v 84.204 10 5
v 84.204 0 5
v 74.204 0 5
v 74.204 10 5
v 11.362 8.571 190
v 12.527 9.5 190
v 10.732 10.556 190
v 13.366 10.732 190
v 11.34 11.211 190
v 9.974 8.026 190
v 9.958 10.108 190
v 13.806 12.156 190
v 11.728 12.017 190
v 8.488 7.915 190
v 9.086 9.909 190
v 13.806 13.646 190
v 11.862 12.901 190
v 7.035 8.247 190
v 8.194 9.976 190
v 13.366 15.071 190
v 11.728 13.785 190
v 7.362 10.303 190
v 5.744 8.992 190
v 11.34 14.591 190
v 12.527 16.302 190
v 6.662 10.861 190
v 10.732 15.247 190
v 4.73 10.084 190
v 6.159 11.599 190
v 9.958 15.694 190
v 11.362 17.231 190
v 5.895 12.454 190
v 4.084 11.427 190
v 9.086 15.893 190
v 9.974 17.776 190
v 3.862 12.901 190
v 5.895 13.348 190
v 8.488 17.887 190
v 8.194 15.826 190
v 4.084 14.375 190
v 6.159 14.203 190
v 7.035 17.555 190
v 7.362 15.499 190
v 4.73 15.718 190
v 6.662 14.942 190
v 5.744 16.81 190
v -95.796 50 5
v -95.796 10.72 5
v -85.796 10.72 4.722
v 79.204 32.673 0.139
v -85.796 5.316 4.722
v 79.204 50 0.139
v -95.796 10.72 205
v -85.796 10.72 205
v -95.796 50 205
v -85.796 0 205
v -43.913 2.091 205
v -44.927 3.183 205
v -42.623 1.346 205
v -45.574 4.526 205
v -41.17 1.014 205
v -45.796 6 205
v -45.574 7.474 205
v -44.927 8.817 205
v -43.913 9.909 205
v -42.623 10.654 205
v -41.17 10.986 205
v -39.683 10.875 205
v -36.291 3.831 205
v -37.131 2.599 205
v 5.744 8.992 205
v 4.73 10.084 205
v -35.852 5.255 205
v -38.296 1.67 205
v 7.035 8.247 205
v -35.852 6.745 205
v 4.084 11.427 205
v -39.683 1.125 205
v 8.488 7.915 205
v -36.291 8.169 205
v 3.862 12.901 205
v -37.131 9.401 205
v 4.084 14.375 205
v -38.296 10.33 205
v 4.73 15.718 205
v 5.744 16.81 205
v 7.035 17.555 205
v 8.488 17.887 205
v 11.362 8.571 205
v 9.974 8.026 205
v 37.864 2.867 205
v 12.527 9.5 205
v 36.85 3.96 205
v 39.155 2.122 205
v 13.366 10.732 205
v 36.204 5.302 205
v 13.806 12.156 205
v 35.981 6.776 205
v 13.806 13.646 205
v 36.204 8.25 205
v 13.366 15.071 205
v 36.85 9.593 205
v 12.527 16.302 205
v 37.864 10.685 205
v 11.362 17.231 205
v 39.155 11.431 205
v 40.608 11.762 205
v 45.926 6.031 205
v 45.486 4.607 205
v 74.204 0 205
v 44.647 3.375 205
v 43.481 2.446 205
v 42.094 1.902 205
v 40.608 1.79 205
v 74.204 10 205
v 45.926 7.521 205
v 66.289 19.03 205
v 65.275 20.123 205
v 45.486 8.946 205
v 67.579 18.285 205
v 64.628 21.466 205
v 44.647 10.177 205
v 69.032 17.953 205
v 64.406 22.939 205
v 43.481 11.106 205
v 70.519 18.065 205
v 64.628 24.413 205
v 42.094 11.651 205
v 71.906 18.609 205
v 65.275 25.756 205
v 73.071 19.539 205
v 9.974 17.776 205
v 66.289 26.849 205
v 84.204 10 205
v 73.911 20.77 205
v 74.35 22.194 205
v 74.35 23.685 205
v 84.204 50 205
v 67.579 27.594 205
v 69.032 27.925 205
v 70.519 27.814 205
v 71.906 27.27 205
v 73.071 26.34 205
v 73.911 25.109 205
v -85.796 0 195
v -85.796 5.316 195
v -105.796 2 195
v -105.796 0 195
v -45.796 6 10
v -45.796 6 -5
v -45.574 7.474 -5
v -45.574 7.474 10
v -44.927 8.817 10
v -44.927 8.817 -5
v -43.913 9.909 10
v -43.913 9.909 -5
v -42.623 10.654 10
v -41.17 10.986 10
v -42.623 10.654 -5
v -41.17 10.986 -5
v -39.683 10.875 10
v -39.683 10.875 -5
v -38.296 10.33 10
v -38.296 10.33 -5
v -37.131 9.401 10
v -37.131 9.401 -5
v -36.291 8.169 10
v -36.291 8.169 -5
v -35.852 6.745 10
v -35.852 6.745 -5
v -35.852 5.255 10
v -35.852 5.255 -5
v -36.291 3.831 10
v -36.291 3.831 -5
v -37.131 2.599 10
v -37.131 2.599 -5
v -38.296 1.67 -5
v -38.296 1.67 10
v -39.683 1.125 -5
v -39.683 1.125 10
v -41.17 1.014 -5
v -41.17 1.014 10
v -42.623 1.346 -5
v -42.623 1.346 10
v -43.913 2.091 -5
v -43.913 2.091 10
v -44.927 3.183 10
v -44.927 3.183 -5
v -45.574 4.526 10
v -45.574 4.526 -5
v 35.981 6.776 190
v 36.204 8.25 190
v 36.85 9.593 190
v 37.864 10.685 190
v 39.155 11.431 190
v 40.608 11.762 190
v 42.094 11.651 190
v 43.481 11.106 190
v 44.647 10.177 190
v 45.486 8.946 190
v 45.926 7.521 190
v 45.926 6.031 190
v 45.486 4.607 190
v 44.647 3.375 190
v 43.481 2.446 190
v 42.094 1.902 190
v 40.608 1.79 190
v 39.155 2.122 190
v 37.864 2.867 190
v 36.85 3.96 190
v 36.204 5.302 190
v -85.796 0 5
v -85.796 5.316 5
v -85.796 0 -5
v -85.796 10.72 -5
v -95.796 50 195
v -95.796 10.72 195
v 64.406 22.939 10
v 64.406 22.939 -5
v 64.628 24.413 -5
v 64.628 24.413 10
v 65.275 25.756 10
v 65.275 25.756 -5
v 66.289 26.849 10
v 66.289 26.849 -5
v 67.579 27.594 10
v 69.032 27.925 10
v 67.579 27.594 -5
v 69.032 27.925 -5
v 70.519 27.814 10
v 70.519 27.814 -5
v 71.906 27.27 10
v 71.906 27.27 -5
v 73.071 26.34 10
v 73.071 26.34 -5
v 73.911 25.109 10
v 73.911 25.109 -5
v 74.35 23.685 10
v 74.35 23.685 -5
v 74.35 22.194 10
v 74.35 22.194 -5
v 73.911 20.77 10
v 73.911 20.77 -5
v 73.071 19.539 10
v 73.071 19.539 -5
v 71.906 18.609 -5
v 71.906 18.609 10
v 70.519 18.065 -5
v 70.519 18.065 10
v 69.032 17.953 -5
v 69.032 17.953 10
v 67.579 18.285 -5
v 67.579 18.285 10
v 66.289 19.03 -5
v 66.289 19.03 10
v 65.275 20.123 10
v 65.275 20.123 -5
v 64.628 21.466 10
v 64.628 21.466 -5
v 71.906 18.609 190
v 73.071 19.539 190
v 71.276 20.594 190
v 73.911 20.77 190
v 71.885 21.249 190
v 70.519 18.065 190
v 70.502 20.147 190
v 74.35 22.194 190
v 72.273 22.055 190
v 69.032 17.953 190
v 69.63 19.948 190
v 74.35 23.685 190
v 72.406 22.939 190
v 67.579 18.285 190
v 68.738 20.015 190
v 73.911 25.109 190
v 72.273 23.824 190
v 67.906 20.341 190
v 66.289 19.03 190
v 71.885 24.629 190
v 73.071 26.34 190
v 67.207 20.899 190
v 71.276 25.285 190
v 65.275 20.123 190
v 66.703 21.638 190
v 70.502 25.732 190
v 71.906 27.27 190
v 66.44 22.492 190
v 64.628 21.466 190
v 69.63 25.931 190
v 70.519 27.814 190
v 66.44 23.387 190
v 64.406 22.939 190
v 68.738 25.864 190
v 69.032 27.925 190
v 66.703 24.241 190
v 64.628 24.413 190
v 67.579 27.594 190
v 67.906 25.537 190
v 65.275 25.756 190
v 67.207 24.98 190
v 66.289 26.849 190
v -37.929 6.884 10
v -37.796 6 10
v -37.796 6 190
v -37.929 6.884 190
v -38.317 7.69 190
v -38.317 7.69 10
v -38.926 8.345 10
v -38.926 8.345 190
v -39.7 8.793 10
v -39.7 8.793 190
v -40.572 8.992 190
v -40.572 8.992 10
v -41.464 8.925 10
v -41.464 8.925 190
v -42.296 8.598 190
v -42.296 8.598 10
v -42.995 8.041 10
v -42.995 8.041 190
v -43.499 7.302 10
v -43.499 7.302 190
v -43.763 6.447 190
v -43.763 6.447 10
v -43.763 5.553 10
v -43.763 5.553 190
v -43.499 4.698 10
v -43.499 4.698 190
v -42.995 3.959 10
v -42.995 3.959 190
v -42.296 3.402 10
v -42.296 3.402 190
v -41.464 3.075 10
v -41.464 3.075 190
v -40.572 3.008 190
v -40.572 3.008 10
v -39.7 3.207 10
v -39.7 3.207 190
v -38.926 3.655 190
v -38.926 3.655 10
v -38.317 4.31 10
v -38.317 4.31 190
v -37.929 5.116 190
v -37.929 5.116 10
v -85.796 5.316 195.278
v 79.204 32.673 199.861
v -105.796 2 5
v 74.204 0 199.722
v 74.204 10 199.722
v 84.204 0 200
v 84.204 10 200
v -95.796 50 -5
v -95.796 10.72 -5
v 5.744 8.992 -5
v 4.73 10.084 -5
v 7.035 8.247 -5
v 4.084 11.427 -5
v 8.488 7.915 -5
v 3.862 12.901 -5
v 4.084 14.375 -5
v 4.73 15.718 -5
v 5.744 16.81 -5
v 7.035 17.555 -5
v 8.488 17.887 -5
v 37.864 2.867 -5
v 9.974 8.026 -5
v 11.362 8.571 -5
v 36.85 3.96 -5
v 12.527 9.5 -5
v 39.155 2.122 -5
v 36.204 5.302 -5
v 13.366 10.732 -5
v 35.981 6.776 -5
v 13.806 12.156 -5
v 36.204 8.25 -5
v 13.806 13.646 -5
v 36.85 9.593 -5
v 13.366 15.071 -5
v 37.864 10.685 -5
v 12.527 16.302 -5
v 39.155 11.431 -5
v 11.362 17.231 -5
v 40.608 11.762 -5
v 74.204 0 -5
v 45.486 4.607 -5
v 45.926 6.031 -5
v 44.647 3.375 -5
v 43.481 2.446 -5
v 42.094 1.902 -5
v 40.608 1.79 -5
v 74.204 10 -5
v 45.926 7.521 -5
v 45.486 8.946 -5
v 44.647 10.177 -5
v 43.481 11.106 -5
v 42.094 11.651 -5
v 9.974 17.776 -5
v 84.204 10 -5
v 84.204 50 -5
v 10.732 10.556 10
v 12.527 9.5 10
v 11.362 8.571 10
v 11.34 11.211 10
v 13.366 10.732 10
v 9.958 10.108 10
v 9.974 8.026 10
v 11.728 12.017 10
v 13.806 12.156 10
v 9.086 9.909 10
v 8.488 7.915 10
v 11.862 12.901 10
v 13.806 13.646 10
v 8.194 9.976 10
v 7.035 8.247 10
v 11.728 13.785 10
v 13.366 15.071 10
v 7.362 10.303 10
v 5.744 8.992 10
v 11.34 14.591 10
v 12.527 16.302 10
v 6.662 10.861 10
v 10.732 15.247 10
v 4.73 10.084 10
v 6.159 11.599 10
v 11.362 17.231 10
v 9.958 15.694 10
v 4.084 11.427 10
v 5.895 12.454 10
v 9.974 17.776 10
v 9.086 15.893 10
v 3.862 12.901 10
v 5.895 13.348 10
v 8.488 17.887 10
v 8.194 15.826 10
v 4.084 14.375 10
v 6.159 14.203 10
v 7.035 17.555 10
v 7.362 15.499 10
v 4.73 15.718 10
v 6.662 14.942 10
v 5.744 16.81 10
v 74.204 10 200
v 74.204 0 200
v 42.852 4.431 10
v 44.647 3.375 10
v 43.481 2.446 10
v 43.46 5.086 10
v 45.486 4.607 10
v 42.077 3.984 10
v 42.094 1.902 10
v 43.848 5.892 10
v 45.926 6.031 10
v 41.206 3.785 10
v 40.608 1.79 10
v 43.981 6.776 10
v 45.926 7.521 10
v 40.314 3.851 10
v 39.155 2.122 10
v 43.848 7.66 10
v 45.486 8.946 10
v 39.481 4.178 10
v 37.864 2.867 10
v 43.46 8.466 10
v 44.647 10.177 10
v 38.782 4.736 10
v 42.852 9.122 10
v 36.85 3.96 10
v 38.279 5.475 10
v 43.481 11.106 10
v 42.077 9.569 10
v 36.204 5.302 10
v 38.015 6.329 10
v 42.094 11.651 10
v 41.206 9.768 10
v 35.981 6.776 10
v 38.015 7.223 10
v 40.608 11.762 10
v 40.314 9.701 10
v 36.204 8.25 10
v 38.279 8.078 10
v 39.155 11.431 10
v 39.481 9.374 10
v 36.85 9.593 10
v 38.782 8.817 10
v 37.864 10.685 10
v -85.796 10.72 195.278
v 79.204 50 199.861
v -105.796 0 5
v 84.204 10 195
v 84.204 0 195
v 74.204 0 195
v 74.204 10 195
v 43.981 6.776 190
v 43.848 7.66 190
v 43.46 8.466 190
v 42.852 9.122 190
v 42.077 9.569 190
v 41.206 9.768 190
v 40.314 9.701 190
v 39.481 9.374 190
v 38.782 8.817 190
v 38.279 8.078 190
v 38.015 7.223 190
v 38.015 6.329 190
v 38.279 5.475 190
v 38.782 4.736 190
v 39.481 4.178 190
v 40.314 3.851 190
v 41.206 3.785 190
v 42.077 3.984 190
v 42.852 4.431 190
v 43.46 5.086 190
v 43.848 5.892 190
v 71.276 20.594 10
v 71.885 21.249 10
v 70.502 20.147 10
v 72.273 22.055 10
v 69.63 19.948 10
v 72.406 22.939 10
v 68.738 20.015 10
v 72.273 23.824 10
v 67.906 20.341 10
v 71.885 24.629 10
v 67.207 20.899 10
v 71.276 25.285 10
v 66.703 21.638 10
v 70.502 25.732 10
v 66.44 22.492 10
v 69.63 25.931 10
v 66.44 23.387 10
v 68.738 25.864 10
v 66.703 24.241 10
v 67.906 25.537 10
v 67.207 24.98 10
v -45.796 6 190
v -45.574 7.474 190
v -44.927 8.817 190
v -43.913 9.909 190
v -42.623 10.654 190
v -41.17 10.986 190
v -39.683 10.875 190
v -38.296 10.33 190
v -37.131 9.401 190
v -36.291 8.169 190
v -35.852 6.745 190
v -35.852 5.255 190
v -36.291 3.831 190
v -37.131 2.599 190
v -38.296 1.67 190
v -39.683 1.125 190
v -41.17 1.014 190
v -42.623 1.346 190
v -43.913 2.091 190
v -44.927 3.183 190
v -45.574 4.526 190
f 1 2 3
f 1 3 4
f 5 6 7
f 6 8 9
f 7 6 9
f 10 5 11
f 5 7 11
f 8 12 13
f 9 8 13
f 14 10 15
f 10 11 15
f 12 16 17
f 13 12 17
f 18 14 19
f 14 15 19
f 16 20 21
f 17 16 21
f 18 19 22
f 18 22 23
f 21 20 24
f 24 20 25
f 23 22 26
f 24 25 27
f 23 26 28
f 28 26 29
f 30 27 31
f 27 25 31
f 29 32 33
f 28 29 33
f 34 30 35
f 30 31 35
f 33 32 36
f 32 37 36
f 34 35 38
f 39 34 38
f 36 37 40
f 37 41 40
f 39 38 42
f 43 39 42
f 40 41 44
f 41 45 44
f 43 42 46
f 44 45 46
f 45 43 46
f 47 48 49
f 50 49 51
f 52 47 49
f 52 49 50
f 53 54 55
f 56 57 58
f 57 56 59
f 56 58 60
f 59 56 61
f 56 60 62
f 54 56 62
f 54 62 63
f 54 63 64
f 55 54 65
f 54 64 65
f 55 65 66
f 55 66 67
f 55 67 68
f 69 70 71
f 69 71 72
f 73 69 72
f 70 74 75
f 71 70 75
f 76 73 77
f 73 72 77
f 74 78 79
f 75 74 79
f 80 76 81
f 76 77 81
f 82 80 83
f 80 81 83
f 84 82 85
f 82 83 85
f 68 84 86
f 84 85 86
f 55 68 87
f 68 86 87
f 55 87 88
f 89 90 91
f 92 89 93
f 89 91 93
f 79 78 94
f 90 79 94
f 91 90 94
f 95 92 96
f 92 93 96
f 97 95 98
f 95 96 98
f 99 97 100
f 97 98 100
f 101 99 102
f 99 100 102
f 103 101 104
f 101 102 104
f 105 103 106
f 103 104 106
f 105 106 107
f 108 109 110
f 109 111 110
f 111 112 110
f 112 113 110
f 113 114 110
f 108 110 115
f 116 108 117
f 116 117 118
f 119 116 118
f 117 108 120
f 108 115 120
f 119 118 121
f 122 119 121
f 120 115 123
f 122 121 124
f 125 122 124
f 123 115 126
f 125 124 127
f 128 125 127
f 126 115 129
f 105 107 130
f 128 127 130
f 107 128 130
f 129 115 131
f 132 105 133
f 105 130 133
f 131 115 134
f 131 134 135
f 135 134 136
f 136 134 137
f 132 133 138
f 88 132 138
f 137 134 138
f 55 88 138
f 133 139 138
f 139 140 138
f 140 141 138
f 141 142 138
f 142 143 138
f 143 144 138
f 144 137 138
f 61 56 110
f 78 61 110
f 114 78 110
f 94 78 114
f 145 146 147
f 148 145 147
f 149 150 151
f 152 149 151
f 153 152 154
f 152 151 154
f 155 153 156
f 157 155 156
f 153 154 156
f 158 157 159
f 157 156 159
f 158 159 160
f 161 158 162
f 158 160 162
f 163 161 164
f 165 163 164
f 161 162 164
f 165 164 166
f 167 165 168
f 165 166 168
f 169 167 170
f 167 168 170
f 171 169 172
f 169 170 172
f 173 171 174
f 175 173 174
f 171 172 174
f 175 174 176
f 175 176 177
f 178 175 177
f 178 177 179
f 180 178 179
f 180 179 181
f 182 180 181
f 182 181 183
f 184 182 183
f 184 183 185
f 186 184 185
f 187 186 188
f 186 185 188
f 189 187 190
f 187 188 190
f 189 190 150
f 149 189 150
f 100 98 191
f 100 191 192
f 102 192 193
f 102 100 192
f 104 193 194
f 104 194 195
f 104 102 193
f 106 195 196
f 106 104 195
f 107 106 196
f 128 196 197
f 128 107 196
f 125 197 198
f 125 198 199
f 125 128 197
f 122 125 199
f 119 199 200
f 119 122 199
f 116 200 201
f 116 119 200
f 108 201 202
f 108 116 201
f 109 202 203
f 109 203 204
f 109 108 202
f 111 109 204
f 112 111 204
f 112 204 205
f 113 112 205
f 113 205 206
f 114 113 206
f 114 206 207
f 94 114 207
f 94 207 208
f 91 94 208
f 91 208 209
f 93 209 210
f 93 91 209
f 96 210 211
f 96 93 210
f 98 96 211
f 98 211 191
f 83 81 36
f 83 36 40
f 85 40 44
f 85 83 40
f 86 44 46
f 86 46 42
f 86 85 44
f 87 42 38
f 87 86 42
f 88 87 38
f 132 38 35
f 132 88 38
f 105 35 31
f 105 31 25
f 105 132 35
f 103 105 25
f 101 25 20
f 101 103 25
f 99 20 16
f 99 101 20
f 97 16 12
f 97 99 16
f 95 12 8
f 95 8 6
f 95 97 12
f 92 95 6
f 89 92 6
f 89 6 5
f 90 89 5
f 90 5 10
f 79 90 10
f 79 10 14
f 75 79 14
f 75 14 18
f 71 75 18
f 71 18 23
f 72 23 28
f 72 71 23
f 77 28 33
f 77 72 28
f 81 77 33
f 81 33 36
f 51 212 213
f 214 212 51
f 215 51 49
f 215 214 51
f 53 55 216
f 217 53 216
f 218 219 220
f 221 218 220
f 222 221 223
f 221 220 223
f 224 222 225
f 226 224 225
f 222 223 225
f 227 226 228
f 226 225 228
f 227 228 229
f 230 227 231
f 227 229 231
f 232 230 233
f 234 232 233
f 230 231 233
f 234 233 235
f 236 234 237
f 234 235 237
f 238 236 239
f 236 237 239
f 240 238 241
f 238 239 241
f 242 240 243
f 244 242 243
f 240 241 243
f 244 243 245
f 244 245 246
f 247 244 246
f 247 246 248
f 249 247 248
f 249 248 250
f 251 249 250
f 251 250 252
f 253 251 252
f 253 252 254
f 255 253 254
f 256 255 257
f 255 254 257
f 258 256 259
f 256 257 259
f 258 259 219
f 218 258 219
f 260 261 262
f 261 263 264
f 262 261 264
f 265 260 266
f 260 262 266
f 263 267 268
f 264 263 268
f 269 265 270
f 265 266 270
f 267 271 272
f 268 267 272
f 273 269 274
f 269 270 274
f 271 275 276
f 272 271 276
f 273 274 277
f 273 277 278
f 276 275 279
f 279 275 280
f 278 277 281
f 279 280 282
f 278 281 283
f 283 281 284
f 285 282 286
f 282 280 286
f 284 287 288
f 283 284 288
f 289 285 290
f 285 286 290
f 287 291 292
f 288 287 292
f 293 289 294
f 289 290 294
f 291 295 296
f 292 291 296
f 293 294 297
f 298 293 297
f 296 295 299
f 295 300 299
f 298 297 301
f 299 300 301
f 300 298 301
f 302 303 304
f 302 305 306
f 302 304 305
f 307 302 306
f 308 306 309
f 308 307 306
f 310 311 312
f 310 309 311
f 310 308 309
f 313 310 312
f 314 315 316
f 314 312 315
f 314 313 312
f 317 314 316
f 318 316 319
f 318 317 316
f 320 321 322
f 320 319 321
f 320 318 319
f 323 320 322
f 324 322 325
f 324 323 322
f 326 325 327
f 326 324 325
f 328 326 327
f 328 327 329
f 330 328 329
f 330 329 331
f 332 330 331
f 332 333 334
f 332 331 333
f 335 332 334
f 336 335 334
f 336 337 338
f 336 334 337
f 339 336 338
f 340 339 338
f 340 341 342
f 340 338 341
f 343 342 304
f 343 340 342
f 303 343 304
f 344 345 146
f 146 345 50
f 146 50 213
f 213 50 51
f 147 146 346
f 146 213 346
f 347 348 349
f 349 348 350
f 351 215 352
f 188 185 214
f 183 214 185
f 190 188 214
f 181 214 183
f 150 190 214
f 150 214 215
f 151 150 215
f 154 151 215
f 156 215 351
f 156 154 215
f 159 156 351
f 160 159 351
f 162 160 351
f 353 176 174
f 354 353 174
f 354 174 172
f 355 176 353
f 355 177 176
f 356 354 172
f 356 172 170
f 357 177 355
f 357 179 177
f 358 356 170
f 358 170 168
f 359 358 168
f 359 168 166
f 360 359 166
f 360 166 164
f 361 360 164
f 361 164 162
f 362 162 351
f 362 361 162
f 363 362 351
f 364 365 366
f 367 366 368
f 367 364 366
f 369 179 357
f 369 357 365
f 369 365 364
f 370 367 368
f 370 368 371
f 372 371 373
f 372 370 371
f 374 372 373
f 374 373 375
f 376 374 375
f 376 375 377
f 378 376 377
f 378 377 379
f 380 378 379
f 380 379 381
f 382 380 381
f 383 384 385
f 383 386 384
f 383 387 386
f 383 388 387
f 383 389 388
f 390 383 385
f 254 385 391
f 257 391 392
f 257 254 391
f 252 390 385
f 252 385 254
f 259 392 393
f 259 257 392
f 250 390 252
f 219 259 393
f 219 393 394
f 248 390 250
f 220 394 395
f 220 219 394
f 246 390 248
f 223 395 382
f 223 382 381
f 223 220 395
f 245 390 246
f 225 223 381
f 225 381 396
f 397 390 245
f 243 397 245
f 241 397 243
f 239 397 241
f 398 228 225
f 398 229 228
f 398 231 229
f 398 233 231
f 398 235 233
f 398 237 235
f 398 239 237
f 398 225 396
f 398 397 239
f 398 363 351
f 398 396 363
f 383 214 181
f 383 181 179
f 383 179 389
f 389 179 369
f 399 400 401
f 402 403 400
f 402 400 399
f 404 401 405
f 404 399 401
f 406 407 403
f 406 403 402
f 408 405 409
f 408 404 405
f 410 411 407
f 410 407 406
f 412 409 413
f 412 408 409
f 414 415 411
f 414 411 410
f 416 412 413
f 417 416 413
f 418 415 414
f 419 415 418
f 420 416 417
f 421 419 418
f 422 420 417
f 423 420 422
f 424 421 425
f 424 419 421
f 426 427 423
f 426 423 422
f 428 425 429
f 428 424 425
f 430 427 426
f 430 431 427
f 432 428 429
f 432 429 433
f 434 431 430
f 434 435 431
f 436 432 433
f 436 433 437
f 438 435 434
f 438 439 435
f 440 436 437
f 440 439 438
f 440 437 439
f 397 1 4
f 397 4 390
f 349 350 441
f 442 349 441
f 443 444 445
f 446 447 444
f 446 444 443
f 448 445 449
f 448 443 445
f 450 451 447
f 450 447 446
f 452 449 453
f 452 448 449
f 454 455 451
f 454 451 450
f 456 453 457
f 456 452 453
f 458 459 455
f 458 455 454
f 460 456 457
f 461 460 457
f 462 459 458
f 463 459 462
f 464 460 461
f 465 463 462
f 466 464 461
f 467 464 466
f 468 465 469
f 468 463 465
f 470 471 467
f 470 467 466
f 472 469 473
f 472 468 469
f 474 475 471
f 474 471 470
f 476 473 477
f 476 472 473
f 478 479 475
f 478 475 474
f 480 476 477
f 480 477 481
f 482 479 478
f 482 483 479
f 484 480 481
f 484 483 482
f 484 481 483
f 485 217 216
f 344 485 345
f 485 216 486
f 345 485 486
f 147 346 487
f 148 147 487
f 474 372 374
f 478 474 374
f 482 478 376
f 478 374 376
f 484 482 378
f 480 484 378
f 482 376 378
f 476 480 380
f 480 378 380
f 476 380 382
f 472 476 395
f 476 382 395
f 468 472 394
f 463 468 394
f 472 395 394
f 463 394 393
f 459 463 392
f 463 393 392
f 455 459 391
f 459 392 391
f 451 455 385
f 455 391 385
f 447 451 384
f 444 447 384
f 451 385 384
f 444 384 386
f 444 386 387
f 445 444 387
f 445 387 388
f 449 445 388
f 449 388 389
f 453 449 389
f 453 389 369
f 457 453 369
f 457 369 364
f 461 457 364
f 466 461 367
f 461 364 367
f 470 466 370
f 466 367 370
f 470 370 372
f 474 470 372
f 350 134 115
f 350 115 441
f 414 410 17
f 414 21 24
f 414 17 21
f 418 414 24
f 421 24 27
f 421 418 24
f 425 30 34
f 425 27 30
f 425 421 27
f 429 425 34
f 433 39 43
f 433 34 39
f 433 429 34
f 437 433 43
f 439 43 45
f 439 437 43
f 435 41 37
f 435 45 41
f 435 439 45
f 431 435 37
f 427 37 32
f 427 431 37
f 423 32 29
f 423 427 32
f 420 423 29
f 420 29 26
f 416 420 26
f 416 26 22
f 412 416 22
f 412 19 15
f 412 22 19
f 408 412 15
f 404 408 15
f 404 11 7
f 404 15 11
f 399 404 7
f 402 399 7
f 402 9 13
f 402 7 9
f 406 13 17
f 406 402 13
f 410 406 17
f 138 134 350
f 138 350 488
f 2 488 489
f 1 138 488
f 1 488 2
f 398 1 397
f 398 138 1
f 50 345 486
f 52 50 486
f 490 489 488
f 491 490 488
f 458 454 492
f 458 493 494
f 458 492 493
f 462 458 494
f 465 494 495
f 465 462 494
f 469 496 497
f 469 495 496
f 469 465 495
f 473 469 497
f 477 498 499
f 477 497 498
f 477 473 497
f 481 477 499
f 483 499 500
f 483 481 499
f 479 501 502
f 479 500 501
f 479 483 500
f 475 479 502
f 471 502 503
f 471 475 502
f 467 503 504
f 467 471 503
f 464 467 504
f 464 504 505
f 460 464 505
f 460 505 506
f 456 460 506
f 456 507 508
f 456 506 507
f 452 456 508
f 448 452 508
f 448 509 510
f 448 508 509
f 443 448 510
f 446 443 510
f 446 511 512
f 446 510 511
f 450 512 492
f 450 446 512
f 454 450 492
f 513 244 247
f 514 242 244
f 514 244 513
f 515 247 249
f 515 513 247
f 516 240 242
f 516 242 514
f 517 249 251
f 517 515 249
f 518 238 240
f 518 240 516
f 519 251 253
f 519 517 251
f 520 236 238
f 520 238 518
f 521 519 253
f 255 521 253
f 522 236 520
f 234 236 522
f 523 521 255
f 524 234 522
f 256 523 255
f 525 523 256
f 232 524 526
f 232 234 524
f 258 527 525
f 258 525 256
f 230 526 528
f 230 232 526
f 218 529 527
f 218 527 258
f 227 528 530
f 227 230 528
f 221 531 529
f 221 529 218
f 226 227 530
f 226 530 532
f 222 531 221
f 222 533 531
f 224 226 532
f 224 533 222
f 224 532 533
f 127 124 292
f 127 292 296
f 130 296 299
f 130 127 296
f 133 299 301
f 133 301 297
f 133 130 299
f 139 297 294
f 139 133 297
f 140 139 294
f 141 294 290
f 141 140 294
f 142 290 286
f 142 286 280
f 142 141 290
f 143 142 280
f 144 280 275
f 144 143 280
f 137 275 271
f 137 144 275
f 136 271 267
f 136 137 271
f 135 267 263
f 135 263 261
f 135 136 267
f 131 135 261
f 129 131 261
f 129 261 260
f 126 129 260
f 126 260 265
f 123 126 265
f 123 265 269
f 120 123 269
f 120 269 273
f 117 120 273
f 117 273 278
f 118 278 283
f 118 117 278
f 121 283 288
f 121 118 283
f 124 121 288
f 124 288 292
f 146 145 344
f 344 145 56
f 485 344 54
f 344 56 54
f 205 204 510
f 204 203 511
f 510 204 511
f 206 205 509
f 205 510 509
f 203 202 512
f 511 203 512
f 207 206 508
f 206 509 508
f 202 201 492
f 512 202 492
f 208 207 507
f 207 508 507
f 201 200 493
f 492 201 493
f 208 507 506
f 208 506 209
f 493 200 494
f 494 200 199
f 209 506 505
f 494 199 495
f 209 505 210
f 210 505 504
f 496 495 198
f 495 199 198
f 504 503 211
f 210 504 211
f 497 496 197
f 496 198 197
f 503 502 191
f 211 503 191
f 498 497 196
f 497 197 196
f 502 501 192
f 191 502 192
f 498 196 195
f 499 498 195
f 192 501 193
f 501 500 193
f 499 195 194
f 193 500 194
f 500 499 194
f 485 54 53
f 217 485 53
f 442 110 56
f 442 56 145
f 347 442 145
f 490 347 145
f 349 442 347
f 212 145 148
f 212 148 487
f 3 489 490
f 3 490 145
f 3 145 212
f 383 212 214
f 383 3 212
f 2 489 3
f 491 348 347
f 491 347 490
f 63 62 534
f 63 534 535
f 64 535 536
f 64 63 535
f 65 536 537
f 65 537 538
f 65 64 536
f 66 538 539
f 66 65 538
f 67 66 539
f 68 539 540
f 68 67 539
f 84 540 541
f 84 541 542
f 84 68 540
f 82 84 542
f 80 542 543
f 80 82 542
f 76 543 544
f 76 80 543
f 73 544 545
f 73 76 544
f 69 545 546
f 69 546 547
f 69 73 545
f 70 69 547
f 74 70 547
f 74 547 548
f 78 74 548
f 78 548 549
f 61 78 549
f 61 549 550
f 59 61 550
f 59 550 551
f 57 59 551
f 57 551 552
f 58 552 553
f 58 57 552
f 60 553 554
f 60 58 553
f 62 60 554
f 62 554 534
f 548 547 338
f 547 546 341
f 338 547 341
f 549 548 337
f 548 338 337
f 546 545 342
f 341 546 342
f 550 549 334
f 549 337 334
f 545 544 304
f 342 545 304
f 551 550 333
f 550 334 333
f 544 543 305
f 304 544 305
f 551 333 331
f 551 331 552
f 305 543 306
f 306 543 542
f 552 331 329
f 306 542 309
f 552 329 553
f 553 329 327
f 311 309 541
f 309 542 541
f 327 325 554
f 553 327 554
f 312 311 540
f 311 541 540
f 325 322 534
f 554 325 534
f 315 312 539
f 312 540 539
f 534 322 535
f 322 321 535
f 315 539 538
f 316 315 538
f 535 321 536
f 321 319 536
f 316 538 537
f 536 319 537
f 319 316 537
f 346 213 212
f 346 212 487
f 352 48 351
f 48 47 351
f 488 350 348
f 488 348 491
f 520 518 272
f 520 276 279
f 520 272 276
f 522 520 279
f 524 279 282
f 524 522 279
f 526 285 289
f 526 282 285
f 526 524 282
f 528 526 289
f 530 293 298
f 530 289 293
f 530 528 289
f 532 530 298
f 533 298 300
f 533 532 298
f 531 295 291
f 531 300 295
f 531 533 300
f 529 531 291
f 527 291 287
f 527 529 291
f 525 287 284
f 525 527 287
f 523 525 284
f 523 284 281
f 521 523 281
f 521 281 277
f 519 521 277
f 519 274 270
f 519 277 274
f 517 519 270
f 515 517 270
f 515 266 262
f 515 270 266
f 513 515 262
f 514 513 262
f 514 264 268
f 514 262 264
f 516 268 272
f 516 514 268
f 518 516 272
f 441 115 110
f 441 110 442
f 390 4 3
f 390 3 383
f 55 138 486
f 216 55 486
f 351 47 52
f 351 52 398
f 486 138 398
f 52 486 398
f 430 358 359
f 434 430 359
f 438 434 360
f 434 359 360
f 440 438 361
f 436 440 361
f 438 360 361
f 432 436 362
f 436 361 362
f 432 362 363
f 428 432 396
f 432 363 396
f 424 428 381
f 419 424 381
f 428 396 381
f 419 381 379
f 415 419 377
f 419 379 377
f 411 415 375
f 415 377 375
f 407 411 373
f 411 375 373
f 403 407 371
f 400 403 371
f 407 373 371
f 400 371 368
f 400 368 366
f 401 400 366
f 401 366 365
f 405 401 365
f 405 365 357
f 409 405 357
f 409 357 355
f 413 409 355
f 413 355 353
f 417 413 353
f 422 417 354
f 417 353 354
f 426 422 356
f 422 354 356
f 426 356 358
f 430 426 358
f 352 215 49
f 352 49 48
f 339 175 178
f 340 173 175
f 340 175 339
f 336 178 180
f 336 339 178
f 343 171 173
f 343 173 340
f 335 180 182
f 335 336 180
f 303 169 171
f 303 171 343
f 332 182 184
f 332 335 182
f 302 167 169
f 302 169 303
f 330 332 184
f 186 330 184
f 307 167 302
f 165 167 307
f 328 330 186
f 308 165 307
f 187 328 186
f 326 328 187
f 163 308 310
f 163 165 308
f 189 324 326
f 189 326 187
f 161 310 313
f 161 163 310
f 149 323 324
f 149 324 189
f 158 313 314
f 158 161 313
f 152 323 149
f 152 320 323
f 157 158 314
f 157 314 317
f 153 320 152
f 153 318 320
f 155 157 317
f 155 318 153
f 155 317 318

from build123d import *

# Parameters (mm, degrees)
ESQUISSE1_R             = 3
BOSS_EXTRU_1_DEPTH      = 200
ESQUISSE4_W             = 5
ESQUISSE4_H             = 50
BOSS_EXTRU_4_DEPTH      = 180
BOSS_EXTRU_7_DEPTH      = 50
ESQUISSE6_W             = 20
ESQUISSE6_H             = 10.719834163
ENL_V_MAT_EXTRU_2_DEPTH = 10
ESQUISSE5_W             = 10
ESQUISSE5_H             = 10
ENL_V_MAT_EXTRU_1_DEPTH = 10
ESQUISSE14_R            = 5
ENL_V_MAT_EXTRU_4_DEPTH = 15
BOSS_EXTRU_8_REACH      = 242.401


with BuildPart() as part:
    # Esquisse1 → Boss.-Extru.1 (new body)
    with BuildSketch(Plane.XY):
        Polygon((-105.796013405, 0), (84.203986595, 0), (84.203986595, 33.502126335), (-105.796013405, 2), align=None)
        with Locations((69.406004871, 22.939397164)):
            Circle(ESQUISSE1_R, mode=Mode.SUBTRACT)
        with Locations((40.981469067, 6.77616521)):
            Circle(ESQUISSE1_R, mode=Mode.SUBTRACT)
        with Locations((-40.796013405, 6)):
            Circle(ESQUISSE1_R, mode=Mode.SUBTRACT)
        with Locations((8.861542866, 12.901085106)):
            Circle(ESQUISSE1_R, mode=Mode.SUBTRACT)
    extrude(amount=BOSS_EXTRU_1_DEPTH)

    # Esquisse4 → Boss.-Extru.4 (add)
    with BuildSketch(Plane(origin=(84.203986595, 0, 0), x_dir=(0, 0, -1), z_dir=(1, 0, 0))):
        with Locations((-202.5, 25)):
            Rectangle(ESQUISSE4_W, ESQUISSE4_H)
        with Locations((2.5, 25)):
            Rectangle(ESQUISSE4_W, ESQUISSE4_H)
    extrude(amount=-BOSS_EXTRU_4_DEPTH)

    # Esquisse8 → Boss.-Extru.7 (add)
    with BuildSketch(Plane(origin=(0, 50, 0), x_dir=(1, 0, 0), z_dir=(0, 1, 0))):
        Polygon((84.203986595, 0), (-95.796013405, 0), (-95.796013405, -5), align=None)
    boss_extru_7 = extrude(amount=-BOSS_EXTRU_7_DEPTH)

    # Esquisse6 → Enlèv. mat.-Extru.2 (cut)
    with BuildSketch(Plane(origin=(0, 0, -5), x_dir=(-1, 0, 0), z_dir=(0, 0, -1))):
        with Locations((95.796013405, 5.359917081)):
            Rectangle(ESQUISSE6_W, ESQUISSE6_H)
    enl_v_mat_extru_2 = extrude(amount=-ENL_V_MAT_EXTRU_2_DEPTH, mode=Mode.SUBTRACT)

    # Esquisse5 → Enlèv. mat.-Extru.1 (cut)
    with BuildSketch(Plane(origin=(84.203986595, 0, 0), x_dir=(0, 0, -1), z_dir=(1, 0, 0))):
        with Locations((-200, 5)):
            Rectangle(ESQUISSE5_W, ESQUISSE5_H)
        with Locations((0, 5)):
            Rectangle(ESQUISSE5_W, ESQUISSE5_H)
    extrude(amount=-ENL_V_MAT_EXTRU_1_DEPTH, mode=Mode.SUBTRACT)

    # Esquisse14 → Enlèv. mat.-Extru.4 (cut)
    with BuildSketch(Plane(origin=(0, 0, -5), x_dir=(-1, 0, 0), z_dir=(0, 0, -1))):
        with Locations((-69.406004871, 22.939397164)):
            Circle(ESQUISSE14_R)
        with Locations((-40.981469067, 6.77616521)):
            Circle(ESQUISSE14_R)
        with Locations((-8.861542866, 12.901085106)):
            Circle(ESQUISSE14_R)
        with Locations((40.796013405, 6)):
            Circle(ESQUISSE14_R)
    enl_v_mat_extru_4 = extrude(amount=-ENL_V_MAT_EXTRU_4_DEPTH, mode=Mode.SUBTRACT)

    # Symétrie3: Boss.-Extru.7, Enlèv. mat.-Extru.2, Enlèv. mat.-Extru.4 across plane
    add(boss_extru_7.mirror(Plane(origin=(0, 0, 100), x_dir=(1, 0, 0), z_dir=(0, 0, -1))))
    add(enl_v_mat_extru_2.mirror(Plane(origin=(0, 0, 100), x_dir=(1, 0, 0), z_dir=(0, 0, -1))), mode=Mode.SUBTRACT)
    add(enl_v_mat_extru_4.mirror(Plane(origin=(0, 0, 100), x_dir=(1, 0, 0), z_dir=(0, 0, -1))), mode=Mode.SUBTRACT)

    # Boss.-Extru.8: up to this plane
    boss_extru_8_end = Plane(origin=(-95.796013405, -180.069431054, 195), z_dir=(-0.0277670672403533, 0, 0.9996144206527183))
    # Esquisse15 → Boss.-Extru.8 (add, up to the surface)
    with BuildSketch(Plane(origin=(0, 0, -5), x_dir=(-1, 0, 0), z_dir=(0, 0, -1)), mode=Mode.PRIVATE) as boss_extru_8_sk1:
        Polygon((-84.203986595, 33.502126335), (-79.203986595, 32.67312301), (-79.203986595, 50), (-84.203986595, 50), align=None)
    boss_extru_8_tool1 = split(extrude(boss_extru_8_sk1.sketch, amount=-BOSS_EXTRU_8_REACH, mode=Mode.PRIVATE), bisect_by=boss_extru_8_end, keep=Keep.BOTH, mode=Mode.PRIVATE)
    add(boss_extru_8_tool1.solids().sort_by_distance((81.683563, 41.542119, -5))[0])


solid = part.part
